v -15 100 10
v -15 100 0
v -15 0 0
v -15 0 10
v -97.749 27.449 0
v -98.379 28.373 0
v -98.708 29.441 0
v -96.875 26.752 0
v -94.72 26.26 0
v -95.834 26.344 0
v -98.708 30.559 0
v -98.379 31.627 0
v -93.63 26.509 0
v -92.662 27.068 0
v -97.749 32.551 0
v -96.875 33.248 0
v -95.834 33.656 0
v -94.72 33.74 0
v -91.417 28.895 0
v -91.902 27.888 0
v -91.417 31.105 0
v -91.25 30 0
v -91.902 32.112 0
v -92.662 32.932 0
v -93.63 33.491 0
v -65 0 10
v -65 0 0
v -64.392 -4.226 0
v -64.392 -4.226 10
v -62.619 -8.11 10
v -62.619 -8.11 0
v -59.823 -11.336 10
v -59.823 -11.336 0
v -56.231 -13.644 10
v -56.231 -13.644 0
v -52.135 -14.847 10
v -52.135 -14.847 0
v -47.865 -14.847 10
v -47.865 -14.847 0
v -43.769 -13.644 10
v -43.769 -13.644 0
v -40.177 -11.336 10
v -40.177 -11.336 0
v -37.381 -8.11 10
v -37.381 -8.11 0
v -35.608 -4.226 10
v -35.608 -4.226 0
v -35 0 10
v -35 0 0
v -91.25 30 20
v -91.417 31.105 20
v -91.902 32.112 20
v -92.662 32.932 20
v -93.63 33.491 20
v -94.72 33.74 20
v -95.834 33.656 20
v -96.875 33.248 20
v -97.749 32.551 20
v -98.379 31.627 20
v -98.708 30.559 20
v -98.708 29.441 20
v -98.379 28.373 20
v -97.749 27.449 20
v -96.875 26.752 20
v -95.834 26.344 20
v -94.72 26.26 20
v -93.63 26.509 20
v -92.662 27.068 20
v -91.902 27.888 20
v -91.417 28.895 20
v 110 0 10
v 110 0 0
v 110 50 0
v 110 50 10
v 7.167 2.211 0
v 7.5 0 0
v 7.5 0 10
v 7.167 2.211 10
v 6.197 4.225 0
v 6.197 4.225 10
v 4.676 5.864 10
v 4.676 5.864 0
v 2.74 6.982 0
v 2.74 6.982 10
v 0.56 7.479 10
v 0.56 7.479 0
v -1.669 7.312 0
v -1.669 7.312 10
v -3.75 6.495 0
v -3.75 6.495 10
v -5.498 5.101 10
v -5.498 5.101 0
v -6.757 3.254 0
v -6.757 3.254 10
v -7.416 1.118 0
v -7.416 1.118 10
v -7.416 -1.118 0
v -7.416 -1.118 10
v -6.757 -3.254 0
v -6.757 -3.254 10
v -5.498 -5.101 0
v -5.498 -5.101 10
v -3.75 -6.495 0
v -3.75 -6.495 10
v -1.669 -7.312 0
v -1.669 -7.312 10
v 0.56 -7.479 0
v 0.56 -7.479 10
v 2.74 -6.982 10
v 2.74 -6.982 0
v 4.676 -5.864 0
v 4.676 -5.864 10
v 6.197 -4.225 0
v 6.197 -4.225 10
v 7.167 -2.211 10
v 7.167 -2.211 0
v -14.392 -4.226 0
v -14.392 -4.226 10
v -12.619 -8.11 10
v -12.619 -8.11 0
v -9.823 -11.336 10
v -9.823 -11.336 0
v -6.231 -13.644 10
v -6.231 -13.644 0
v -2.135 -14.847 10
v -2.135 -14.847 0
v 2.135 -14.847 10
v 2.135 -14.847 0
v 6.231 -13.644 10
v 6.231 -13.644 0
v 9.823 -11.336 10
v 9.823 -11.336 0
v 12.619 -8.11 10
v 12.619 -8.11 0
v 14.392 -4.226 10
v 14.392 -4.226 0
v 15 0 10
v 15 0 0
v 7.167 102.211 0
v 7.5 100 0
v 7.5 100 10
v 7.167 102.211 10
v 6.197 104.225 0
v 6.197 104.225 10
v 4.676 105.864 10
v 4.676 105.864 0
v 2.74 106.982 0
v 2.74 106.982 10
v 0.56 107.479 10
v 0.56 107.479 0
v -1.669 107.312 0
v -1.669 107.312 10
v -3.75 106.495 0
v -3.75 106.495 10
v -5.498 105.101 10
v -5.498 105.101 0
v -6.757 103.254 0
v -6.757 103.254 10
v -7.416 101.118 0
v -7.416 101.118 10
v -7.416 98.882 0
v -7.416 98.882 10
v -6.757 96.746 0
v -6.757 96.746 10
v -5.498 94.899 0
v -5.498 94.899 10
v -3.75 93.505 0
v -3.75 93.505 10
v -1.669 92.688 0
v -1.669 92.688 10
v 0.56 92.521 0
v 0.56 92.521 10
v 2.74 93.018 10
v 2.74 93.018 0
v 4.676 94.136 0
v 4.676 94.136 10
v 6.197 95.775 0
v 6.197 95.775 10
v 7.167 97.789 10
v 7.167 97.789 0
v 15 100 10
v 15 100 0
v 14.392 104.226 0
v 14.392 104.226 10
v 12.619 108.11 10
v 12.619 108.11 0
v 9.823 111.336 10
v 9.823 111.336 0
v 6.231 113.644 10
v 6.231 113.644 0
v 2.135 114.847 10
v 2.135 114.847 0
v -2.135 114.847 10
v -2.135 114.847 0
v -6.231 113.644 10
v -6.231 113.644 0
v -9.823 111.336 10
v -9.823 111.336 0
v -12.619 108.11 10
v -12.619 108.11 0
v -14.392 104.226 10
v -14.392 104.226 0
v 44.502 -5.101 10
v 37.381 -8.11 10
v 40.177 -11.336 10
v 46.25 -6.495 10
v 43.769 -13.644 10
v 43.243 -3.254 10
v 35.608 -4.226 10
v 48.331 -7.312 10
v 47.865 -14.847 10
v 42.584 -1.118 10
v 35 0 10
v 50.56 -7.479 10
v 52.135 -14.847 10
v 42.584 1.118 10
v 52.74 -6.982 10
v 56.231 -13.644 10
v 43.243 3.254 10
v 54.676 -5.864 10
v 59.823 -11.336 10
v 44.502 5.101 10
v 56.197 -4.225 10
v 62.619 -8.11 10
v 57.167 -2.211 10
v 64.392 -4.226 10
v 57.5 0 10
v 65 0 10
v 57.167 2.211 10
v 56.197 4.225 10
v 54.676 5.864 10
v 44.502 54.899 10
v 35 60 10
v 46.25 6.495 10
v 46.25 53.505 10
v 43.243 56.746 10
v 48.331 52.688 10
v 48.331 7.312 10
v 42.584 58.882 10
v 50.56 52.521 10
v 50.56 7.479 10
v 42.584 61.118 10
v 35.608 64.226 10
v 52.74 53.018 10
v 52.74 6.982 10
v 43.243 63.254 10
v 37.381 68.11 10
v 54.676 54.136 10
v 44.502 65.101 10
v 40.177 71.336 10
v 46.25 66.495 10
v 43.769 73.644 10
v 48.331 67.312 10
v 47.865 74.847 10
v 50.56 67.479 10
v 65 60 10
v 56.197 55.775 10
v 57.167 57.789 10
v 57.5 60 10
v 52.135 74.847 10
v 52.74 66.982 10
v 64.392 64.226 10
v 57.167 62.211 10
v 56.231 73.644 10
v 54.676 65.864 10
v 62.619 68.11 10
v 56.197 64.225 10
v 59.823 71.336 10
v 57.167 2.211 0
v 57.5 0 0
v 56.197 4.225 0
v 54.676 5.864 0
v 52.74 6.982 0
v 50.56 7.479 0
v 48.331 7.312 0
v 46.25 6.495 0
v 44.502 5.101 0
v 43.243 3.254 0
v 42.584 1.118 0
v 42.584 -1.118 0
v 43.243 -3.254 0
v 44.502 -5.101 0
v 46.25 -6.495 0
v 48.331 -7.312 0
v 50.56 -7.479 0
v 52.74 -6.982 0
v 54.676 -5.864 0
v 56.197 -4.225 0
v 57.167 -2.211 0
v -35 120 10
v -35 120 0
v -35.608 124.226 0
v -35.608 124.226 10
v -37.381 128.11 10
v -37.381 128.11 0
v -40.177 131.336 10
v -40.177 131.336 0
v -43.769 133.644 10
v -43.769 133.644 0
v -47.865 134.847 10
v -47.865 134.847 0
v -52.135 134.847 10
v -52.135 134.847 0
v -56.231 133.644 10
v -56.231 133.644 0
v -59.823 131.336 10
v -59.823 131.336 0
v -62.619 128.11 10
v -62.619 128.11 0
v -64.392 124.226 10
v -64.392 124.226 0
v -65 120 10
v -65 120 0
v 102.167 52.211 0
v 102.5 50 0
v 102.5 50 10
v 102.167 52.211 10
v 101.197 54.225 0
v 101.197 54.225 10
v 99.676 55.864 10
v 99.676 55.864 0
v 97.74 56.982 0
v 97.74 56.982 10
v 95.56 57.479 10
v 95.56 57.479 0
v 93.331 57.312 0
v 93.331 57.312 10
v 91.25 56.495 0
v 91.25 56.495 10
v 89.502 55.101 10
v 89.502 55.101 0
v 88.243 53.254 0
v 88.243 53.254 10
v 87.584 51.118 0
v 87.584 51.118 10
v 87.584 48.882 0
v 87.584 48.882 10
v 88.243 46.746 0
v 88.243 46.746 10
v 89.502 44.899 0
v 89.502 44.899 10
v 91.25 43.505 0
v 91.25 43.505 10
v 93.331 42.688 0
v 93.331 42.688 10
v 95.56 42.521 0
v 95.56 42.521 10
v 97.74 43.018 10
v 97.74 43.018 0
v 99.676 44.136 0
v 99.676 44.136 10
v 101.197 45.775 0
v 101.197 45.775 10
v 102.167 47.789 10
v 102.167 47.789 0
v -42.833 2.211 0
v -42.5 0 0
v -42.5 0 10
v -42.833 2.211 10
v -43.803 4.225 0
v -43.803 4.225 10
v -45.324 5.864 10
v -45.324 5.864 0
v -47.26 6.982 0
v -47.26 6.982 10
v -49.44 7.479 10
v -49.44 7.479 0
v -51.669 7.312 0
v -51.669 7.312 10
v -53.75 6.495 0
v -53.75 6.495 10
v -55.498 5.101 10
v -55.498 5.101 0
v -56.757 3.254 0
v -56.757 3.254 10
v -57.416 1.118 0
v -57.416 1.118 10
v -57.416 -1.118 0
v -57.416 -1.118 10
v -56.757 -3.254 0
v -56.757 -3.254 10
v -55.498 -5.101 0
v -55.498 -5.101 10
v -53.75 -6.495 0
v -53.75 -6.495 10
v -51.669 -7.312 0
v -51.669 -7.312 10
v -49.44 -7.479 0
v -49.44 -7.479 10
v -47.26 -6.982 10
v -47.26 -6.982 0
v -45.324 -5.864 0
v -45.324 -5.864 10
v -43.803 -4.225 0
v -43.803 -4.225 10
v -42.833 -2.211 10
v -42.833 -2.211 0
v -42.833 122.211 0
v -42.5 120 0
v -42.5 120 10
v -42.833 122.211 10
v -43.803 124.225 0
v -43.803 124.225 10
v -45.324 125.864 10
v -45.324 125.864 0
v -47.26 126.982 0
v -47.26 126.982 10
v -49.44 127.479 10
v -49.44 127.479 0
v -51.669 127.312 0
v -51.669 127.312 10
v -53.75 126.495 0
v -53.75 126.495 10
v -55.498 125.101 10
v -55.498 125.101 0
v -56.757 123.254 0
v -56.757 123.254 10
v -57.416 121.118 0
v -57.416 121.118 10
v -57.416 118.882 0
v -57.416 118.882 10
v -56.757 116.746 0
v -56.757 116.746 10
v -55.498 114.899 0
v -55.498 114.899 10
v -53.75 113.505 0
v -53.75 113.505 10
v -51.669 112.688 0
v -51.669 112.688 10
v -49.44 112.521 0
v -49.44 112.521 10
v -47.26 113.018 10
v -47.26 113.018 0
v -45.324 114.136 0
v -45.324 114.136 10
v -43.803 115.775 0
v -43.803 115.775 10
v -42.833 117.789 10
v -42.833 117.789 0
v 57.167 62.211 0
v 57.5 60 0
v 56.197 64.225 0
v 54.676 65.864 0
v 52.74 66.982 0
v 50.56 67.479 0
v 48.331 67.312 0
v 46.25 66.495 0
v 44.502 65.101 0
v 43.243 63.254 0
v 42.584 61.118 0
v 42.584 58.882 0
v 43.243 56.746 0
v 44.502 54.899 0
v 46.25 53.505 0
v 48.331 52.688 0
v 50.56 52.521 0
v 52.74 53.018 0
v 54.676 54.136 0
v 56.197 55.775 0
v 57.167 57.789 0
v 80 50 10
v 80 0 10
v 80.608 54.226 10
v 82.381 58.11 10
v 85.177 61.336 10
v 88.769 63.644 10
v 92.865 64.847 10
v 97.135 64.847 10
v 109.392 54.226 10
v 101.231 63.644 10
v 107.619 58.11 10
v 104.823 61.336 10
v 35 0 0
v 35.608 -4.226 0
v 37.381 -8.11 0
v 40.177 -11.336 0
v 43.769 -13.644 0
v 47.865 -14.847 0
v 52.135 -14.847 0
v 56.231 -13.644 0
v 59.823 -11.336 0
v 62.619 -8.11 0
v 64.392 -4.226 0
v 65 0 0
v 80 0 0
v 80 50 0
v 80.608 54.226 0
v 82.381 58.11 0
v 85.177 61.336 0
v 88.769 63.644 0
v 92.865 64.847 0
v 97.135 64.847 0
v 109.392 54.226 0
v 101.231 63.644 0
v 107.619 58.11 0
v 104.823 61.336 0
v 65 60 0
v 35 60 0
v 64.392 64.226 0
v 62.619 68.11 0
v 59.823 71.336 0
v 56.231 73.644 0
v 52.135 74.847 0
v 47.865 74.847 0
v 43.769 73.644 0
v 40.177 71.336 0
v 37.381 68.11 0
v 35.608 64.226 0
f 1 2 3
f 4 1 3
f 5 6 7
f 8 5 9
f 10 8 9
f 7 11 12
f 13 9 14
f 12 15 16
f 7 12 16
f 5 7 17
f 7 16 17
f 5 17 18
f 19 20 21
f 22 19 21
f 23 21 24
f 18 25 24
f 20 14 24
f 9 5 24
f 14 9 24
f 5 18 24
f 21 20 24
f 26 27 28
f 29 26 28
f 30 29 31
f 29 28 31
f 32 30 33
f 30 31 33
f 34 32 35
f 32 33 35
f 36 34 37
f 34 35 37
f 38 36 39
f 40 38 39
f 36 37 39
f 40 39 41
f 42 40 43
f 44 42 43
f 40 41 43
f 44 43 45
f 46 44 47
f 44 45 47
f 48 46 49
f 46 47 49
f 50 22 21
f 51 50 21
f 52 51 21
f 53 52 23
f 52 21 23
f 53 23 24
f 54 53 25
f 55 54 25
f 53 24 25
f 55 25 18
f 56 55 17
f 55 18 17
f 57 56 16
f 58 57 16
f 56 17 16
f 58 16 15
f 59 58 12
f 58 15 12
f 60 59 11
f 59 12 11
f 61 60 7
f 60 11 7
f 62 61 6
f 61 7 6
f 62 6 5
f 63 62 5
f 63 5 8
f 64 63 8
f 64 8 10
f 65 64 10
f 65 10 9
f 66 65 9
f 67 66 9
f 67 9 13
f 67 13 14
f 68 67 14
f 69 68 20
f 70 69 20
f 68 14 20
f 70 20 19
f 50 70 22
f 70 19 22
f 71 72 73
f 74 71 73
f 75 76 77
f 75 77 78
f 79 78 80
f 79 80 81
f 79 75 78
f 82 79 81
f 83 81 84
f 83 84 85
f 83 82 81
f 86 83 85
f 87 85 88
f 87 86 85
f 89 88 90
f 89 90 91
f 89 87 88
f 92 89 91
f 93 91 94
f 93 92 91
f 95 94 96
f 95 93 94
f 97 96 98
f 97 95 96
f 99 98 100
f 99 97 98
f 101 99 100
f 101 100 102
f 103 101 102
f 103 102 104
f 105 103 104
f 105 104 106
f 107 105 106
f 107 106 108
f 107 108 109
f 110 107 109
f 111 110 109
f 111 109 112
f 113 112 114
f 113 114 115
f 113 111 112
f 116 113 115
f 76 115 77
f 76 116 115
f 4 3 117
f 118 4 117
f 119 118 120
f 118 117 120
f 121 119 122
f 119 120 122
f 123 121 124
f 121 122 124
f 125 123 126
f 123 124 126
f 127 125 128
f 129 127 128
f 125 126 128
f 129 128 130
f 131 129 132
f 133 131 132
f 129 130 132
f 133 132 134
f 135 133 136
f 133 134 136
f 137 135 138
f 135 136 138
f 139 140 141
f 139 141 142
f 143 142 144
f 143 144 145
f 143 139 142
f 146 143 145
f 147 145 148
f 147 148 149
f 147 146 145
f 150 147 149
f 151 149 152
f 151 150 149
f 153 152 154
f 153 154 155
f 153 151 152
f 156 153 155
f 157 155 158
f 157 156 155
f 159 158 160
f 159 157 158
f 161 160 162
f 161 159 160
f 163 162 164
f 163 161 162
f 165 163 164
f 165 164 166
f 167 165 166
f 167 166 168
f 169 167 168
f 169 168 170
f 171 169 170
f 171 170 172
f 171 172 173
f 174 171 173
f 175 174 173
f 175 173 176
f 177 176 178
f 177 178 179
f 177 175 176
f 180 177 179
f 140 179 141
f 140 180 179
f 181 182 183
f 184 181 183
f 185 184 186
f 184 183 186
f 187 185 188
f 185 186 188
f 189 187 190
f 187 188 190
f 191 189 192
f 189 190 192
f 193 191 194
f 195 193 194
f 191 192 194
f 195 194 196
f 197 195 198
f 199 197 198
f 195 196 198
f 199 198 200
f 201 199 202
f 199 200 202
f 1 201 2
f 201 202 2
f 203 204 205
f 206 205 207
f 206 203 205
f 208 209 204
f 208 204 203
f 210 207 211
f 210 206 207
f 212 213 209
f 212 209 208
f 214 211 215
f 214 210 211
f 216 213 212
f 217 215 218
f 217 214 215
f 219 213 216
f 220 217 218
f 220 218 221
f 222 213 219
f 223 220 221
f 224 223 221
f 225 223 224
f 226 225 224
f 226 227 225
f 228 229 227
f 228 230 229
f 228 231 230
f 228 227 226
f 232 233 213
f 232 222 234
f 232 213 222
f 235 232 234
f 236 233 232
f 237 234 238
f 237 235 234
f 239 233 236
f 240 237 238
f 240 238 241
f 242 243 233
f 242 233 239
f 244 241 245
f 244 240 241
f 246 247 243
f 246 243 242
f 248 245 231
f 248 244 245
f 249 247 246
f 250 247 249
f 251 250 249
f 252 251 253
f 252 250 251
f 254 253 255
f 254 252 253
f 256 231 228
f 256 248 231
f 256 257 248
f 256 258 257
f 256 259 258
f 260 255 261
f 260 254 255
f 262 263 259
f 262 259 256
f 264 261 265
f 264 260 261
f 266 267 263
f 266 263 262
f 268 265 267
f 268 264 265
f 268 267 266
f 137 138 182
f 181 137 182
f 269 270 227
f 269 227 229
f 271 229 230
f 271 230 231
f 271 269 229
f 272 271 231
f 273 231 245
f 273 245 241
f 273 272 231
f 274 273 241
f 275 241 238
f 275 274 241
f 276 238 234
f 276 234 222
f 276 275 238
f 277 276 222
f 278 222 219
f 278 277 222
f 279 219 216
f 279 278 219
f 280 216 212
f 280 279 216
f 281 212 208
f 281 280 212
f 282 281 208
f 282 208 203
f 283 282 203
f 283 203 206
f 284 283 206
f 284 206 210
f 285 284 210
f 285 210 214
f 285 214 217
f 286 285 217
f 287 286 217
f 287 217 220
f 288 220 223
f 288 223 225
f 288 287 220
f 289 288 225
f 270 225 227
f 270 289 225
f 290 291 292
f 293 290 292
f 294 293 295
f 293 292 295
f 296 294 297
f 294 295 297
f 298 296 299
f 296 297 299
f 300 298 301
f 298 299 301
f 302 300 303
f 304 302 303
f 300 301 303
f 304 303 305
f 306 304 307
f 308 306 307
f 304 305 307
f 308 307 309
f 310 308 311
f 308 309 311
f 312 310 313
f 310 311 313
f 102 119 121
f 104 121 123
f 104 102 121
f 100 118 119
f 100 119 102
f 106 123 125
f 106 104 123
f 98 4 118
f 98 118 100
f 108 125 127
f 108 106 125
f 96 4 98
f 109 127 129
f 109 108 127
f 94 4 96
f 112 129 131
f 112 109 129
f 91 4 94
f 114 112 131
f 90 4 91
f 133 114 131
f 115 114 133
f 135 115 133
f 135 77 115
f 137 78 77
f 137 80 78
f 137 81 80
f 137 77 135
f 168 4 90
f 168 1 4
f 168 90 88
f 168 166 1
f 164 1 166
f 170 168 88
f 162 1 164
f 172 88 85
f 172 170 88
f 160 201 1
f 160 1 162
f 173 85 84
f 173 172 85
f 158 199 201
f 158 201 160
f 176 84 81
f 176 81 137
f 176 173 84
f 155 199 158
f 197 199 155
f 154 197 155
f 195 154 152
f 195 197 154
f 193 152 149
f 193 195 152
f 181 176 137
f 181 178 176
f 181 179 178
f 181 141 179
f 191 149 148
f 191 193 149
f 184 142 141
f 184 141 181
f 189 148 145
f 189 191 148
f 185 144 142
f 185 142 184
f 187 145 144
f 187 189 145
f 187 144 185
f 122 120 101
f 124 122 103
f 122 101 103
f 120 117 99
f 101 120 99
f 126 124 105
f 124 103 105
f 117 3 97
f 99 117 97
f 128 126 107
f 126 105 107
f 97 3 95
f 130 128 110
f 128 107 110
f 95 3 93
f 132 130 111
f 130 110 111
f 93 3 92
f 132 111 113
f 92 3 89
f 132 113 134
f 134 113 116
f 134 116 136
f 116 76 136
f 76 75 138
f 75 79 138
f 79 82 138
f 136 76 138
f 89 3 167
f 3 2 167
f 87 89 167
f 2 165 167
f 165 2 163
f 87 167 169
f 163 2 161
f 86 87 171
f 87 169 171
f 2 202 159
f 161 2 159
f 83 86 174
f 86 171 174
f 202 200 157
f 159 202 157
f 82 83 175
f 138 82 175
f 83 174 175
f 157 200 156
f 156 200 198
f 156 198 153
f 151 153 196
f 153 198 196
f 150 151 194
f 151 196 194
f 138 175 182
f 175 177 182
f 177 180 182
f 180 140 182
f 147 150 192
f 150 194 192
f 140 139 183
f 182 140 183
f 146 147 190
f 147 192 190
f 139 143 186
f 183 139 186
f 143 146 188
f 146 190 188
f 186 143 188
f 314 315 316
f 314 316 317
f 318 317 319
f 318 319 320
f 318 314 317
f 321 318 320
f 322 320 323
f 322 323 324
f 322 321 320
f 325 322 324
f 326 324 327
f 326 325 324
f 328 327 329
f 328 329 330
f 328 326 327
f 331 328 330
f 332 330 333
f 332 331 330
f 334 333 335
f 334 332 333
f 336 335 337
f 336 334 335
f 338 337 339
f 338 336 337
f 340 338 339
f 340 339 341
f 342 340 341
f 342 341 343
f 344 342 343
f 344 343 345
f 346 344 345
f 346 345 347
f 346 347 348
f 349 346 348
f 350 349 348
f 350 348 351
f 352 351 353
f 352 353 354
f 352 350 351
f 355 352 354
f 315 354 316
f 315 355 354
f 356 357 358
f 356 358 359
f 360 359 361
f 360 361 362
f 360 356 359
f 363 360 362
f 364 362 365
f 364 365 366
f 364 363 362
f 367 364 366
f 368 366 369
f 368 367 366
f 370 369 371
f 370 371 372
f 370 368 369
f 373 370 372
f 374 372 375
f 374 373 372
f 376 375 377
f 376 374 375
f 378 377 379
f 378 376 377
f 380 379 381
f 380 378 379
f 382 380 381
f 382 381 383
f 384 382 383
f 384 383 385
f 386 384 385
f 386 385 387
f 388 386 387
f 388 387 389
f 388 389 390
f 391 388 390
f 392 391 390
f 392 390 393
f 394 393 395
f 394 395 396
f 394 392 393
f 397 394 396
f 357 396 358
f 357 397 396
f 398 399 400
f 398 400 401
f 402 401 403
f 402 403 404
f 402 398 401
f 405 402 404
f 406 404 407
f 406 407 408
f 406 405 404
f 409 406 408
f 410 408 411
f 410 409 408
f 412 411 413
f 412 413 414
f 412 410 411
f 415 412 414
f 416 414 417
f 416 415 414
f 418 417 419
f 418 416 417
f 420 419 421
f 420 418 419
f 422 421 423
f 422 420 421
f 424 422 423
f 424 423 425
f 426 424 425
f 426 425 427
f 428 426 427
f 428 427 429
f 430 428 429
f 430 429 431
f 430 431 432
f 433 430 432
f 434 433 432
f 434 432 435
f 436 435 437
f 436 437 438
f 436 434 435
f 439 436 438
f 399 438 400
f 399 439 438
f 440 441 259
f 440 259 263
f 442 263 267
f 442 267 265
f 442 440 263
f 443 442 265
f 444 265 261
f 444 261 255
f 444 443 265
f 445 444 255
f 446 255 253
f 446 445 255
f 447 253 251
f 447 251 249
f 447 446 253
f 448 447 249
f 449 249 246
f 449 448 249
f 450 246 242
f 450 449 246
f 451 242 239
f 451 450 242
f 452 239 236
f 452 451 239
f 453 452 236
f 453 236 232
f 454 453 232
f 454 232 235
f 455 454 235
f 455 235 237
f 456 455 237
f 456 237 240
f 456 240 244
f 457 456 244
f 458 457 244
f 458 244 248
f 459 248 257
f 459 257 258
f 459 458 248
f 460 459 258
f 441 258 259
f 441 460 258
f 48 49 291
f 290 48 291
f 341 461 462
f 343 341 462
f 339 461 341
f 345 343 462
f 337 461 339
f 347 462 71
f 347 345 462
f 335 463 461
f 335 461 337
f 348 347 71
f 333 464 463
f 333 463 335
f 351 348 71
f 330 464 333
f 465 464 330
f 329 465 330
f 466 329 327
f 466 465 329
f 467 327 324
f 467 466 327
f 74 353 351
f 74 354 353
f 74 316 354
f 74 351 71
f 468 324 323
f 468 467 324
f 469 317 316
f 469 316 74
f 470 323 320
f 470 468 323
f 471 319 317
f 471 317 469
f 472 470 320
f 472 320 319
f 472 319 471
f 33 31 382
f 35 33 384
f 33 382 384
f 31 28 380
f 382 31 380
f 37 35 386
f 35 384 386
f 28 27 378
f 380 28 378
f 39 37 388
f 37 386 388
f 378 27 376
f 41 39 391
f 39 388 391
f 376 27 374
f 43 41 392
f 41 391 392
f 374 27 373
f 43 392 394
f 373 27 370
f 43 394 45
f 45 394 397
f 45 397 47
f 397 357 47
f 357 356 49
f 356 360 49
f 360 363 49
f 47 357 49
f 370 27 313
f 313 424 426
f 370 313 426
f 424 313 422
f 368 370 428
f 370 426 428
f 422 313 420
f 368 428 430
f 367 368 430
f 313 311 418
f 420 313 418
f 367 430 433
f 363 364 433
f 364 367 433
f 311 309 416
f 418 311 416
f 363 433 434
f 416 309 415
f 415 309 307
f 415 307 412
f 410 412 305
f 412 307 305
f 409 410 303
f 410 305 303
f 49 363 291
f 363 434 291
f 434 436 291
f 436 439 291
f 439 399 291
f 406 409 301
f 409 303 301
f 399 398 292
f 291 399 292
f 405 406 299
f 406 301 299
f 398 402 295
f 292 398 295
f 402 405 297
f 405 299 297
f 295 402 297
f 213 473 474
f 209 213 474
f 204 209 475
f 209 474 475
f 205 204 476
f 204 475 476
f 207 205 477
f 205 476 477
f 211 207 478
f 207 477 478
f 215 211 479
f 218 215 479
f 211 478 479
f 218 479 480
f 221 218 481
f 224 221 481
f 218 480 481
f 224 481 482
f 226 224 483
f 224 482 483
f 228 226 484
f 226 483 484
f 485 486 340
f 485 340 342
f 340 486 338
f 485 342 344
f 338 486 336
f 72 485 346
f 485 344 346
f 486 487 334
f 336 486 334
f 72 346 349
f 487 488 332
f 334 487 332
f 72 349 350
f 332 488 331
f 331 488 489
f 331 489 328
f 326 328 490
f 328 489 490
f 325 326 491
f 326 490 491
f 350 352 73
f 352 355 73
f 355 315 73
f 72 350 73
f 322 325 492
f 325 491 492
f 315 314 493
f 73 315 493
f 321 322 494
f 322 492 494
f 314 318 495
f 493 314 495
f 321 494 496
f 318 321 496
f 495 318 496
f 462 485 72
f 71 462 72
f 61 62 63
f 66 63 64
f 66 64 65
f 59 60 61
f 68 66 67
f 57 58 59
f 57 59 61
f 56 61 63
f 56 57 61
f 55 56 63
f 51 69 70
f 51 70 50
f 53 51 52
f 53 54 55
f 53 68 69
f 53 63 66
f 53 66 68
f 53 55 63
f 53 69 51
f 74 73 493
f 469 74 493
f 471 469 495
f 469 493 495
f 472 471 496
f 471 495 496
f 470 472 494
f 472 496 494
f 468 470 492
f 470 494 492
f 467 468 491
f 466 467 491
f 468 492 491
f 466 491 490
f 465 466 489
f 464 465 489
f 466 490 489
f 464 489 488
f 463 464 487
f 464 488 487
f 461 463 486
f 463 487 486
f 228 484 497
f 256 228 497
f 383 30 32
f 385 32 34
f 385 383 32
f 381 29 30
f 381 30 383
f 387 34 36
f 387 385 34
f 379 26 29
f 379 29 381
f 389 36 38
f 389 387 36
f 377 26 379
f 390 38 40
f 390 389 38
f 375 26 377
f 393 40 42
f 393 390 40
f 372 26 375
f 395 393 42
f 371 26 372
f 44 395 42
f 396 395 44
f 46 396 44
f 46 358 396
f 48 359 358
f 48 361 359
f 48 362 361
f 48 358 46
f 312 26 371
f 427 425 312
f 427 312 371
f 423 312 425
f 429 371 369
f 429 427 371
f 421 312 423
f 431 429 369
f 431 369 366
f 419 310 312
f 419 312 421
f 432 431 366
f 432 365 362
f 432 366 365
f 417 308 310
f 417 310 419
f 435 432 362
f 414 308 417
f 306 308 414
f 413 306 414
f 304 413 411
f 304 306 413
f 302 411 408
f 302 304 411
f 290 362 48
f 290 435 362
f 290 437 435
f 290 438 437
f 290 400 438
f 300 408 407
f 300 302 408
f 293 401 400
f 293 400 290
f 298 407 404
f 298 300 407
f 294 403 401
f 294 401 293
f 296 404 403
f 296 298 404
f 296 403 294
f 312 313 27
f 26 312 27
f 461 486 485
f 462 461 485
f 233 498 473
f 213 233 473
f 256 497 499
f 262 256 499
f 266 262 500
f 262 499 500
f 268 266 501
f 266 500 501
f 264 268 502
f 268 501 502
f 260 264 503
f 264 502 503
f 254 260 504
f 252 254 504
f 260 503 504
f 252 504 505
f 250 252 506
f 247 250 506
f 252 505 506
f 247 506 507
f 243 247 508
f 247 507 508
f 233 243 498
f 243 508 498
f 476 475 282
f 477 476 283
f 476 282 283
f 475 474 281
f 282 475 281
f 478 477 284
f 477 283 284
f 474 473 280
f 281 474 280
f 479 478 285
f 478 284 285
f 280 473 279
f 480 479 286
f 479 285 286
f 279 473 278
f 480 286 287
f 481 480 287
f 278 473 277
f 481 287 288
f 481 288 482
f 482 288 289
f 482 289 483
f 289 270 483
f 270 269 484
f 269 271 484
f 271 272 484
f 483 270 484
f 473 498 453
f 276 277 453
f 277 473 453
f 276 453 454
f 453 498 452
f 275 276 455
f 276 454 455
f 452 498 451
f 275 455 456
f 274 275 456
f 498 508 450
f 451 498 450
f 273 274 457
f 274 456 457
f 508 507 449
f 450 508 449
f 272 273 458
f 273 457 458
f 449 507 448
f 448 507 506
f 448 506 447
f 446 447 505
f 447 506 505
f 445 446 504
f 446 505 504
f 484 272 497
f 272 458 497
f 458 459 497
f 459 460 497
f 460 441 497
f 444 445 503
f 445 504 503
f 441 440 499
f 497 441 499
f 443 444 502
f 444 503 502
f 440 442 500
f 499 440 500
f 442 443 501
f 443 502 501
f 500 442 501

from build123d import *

# Parameters (mm, degrees)
F1_R     = 7.5
F2_DEPTH = 10
F1_R_2   = 3.75
F3_DEPTH = 20


with BuildPart() as f2:
    # F1 (on Top) → F2 (new body)
    with BuildSketch(Plane.XY):
        with BuildLine():
            Line((-35, 0), (-35, 120))
            ThreePointArc((-35, 120), (-50, 135), (-65, 120))
            Line((-65, 120), (-65, 0))
            ThreePointArc((-65, 0), (-50, -15), (-35, 0))
        make_face()
        with Locations((-50, 0)):
            Circle(F1_R, mode=Mode.SUBTRACT)
        with Locations((-50, 120)):
            Circle(F1_R, mode=Mode.SUBTRACT)
    extrude(amount=F2_DEPTH)


with BuildPart() as f2b:
    # F1 (on Top) → F2, piece 2 (new body)
    with BuildSketch(Plane.XY):
        with BuildLine():
            Line((-15, 50), (-15, 0))
            ThreePointArc((-15, 0), (0, -15), (15, 0))
            Line((15, 0), (15, 50))
            Line((15, 50), (15, 100))
            ThreePointArc((15, 100), (0, 115), (-15, 100))
            Line((-15, 100), (-15, 50))
        make_face()
        Circle(F1_R, mode=Mode.SUBTRACT)
        with Locations((0, 100)):
            Circle(F1_R, mode=Mode.SUBTRACT)
    extrude(amount=F2_DEPTH)


with BuildPart() as f2c:
    # F1 (on Top) → F2, piece 3 (new body)
    with BuildSketch(Plane.XY):
        with BuildLine():
            Line((35, 30), (35, 0))
            ThreePointArc((35, 0), (50, -15), (65, 0))
            Line((65, 0), (65, 30))
            Line((65, 30), (65, 60))
            ThreePointArc((65, 60), (50, 75), (35, 60))
            Line((35, 60), (35, 30))
        make_face()
        with Locations((50, 0)):
            Circle(F1_R, mode=Mode.SUBTRACT)
        with Locations((50, 60)):
            Circle(F1_R, mode=Mode.SUBTRACT)
    extrude(amount=F2_DEPTH)


with BuildPart() as f2d:
    # F1 (on Top) → F2, piece 4 (new body)
    with BuildSketch(Plane.XY):
        with BuildLine():
            Line((80, 50), (80, 0))
            Line((80, 0), (110, 0))
            Line((110, 0), (110, 50))
            ThreePointArc((110, 50), (95, 65), (80, 50))
        make_face()
        with Locations((95, 50)):
            Circle(F1_R, mode=Mode.SUBTRACT)
    extrude(amount=F2_DEPTH)


with BuildPart() as f3:
    # F1 (on Top) → F3 (new body)
    with BuildSketch(Plane.XY):
        with Locations((-95, 30)):
            Circle(F1_R_2)
    extrude(amount=F3_DEPTH)


solid = Compound([f2.part, f2b.part, f2c.part, f2d.part, f3.part])
